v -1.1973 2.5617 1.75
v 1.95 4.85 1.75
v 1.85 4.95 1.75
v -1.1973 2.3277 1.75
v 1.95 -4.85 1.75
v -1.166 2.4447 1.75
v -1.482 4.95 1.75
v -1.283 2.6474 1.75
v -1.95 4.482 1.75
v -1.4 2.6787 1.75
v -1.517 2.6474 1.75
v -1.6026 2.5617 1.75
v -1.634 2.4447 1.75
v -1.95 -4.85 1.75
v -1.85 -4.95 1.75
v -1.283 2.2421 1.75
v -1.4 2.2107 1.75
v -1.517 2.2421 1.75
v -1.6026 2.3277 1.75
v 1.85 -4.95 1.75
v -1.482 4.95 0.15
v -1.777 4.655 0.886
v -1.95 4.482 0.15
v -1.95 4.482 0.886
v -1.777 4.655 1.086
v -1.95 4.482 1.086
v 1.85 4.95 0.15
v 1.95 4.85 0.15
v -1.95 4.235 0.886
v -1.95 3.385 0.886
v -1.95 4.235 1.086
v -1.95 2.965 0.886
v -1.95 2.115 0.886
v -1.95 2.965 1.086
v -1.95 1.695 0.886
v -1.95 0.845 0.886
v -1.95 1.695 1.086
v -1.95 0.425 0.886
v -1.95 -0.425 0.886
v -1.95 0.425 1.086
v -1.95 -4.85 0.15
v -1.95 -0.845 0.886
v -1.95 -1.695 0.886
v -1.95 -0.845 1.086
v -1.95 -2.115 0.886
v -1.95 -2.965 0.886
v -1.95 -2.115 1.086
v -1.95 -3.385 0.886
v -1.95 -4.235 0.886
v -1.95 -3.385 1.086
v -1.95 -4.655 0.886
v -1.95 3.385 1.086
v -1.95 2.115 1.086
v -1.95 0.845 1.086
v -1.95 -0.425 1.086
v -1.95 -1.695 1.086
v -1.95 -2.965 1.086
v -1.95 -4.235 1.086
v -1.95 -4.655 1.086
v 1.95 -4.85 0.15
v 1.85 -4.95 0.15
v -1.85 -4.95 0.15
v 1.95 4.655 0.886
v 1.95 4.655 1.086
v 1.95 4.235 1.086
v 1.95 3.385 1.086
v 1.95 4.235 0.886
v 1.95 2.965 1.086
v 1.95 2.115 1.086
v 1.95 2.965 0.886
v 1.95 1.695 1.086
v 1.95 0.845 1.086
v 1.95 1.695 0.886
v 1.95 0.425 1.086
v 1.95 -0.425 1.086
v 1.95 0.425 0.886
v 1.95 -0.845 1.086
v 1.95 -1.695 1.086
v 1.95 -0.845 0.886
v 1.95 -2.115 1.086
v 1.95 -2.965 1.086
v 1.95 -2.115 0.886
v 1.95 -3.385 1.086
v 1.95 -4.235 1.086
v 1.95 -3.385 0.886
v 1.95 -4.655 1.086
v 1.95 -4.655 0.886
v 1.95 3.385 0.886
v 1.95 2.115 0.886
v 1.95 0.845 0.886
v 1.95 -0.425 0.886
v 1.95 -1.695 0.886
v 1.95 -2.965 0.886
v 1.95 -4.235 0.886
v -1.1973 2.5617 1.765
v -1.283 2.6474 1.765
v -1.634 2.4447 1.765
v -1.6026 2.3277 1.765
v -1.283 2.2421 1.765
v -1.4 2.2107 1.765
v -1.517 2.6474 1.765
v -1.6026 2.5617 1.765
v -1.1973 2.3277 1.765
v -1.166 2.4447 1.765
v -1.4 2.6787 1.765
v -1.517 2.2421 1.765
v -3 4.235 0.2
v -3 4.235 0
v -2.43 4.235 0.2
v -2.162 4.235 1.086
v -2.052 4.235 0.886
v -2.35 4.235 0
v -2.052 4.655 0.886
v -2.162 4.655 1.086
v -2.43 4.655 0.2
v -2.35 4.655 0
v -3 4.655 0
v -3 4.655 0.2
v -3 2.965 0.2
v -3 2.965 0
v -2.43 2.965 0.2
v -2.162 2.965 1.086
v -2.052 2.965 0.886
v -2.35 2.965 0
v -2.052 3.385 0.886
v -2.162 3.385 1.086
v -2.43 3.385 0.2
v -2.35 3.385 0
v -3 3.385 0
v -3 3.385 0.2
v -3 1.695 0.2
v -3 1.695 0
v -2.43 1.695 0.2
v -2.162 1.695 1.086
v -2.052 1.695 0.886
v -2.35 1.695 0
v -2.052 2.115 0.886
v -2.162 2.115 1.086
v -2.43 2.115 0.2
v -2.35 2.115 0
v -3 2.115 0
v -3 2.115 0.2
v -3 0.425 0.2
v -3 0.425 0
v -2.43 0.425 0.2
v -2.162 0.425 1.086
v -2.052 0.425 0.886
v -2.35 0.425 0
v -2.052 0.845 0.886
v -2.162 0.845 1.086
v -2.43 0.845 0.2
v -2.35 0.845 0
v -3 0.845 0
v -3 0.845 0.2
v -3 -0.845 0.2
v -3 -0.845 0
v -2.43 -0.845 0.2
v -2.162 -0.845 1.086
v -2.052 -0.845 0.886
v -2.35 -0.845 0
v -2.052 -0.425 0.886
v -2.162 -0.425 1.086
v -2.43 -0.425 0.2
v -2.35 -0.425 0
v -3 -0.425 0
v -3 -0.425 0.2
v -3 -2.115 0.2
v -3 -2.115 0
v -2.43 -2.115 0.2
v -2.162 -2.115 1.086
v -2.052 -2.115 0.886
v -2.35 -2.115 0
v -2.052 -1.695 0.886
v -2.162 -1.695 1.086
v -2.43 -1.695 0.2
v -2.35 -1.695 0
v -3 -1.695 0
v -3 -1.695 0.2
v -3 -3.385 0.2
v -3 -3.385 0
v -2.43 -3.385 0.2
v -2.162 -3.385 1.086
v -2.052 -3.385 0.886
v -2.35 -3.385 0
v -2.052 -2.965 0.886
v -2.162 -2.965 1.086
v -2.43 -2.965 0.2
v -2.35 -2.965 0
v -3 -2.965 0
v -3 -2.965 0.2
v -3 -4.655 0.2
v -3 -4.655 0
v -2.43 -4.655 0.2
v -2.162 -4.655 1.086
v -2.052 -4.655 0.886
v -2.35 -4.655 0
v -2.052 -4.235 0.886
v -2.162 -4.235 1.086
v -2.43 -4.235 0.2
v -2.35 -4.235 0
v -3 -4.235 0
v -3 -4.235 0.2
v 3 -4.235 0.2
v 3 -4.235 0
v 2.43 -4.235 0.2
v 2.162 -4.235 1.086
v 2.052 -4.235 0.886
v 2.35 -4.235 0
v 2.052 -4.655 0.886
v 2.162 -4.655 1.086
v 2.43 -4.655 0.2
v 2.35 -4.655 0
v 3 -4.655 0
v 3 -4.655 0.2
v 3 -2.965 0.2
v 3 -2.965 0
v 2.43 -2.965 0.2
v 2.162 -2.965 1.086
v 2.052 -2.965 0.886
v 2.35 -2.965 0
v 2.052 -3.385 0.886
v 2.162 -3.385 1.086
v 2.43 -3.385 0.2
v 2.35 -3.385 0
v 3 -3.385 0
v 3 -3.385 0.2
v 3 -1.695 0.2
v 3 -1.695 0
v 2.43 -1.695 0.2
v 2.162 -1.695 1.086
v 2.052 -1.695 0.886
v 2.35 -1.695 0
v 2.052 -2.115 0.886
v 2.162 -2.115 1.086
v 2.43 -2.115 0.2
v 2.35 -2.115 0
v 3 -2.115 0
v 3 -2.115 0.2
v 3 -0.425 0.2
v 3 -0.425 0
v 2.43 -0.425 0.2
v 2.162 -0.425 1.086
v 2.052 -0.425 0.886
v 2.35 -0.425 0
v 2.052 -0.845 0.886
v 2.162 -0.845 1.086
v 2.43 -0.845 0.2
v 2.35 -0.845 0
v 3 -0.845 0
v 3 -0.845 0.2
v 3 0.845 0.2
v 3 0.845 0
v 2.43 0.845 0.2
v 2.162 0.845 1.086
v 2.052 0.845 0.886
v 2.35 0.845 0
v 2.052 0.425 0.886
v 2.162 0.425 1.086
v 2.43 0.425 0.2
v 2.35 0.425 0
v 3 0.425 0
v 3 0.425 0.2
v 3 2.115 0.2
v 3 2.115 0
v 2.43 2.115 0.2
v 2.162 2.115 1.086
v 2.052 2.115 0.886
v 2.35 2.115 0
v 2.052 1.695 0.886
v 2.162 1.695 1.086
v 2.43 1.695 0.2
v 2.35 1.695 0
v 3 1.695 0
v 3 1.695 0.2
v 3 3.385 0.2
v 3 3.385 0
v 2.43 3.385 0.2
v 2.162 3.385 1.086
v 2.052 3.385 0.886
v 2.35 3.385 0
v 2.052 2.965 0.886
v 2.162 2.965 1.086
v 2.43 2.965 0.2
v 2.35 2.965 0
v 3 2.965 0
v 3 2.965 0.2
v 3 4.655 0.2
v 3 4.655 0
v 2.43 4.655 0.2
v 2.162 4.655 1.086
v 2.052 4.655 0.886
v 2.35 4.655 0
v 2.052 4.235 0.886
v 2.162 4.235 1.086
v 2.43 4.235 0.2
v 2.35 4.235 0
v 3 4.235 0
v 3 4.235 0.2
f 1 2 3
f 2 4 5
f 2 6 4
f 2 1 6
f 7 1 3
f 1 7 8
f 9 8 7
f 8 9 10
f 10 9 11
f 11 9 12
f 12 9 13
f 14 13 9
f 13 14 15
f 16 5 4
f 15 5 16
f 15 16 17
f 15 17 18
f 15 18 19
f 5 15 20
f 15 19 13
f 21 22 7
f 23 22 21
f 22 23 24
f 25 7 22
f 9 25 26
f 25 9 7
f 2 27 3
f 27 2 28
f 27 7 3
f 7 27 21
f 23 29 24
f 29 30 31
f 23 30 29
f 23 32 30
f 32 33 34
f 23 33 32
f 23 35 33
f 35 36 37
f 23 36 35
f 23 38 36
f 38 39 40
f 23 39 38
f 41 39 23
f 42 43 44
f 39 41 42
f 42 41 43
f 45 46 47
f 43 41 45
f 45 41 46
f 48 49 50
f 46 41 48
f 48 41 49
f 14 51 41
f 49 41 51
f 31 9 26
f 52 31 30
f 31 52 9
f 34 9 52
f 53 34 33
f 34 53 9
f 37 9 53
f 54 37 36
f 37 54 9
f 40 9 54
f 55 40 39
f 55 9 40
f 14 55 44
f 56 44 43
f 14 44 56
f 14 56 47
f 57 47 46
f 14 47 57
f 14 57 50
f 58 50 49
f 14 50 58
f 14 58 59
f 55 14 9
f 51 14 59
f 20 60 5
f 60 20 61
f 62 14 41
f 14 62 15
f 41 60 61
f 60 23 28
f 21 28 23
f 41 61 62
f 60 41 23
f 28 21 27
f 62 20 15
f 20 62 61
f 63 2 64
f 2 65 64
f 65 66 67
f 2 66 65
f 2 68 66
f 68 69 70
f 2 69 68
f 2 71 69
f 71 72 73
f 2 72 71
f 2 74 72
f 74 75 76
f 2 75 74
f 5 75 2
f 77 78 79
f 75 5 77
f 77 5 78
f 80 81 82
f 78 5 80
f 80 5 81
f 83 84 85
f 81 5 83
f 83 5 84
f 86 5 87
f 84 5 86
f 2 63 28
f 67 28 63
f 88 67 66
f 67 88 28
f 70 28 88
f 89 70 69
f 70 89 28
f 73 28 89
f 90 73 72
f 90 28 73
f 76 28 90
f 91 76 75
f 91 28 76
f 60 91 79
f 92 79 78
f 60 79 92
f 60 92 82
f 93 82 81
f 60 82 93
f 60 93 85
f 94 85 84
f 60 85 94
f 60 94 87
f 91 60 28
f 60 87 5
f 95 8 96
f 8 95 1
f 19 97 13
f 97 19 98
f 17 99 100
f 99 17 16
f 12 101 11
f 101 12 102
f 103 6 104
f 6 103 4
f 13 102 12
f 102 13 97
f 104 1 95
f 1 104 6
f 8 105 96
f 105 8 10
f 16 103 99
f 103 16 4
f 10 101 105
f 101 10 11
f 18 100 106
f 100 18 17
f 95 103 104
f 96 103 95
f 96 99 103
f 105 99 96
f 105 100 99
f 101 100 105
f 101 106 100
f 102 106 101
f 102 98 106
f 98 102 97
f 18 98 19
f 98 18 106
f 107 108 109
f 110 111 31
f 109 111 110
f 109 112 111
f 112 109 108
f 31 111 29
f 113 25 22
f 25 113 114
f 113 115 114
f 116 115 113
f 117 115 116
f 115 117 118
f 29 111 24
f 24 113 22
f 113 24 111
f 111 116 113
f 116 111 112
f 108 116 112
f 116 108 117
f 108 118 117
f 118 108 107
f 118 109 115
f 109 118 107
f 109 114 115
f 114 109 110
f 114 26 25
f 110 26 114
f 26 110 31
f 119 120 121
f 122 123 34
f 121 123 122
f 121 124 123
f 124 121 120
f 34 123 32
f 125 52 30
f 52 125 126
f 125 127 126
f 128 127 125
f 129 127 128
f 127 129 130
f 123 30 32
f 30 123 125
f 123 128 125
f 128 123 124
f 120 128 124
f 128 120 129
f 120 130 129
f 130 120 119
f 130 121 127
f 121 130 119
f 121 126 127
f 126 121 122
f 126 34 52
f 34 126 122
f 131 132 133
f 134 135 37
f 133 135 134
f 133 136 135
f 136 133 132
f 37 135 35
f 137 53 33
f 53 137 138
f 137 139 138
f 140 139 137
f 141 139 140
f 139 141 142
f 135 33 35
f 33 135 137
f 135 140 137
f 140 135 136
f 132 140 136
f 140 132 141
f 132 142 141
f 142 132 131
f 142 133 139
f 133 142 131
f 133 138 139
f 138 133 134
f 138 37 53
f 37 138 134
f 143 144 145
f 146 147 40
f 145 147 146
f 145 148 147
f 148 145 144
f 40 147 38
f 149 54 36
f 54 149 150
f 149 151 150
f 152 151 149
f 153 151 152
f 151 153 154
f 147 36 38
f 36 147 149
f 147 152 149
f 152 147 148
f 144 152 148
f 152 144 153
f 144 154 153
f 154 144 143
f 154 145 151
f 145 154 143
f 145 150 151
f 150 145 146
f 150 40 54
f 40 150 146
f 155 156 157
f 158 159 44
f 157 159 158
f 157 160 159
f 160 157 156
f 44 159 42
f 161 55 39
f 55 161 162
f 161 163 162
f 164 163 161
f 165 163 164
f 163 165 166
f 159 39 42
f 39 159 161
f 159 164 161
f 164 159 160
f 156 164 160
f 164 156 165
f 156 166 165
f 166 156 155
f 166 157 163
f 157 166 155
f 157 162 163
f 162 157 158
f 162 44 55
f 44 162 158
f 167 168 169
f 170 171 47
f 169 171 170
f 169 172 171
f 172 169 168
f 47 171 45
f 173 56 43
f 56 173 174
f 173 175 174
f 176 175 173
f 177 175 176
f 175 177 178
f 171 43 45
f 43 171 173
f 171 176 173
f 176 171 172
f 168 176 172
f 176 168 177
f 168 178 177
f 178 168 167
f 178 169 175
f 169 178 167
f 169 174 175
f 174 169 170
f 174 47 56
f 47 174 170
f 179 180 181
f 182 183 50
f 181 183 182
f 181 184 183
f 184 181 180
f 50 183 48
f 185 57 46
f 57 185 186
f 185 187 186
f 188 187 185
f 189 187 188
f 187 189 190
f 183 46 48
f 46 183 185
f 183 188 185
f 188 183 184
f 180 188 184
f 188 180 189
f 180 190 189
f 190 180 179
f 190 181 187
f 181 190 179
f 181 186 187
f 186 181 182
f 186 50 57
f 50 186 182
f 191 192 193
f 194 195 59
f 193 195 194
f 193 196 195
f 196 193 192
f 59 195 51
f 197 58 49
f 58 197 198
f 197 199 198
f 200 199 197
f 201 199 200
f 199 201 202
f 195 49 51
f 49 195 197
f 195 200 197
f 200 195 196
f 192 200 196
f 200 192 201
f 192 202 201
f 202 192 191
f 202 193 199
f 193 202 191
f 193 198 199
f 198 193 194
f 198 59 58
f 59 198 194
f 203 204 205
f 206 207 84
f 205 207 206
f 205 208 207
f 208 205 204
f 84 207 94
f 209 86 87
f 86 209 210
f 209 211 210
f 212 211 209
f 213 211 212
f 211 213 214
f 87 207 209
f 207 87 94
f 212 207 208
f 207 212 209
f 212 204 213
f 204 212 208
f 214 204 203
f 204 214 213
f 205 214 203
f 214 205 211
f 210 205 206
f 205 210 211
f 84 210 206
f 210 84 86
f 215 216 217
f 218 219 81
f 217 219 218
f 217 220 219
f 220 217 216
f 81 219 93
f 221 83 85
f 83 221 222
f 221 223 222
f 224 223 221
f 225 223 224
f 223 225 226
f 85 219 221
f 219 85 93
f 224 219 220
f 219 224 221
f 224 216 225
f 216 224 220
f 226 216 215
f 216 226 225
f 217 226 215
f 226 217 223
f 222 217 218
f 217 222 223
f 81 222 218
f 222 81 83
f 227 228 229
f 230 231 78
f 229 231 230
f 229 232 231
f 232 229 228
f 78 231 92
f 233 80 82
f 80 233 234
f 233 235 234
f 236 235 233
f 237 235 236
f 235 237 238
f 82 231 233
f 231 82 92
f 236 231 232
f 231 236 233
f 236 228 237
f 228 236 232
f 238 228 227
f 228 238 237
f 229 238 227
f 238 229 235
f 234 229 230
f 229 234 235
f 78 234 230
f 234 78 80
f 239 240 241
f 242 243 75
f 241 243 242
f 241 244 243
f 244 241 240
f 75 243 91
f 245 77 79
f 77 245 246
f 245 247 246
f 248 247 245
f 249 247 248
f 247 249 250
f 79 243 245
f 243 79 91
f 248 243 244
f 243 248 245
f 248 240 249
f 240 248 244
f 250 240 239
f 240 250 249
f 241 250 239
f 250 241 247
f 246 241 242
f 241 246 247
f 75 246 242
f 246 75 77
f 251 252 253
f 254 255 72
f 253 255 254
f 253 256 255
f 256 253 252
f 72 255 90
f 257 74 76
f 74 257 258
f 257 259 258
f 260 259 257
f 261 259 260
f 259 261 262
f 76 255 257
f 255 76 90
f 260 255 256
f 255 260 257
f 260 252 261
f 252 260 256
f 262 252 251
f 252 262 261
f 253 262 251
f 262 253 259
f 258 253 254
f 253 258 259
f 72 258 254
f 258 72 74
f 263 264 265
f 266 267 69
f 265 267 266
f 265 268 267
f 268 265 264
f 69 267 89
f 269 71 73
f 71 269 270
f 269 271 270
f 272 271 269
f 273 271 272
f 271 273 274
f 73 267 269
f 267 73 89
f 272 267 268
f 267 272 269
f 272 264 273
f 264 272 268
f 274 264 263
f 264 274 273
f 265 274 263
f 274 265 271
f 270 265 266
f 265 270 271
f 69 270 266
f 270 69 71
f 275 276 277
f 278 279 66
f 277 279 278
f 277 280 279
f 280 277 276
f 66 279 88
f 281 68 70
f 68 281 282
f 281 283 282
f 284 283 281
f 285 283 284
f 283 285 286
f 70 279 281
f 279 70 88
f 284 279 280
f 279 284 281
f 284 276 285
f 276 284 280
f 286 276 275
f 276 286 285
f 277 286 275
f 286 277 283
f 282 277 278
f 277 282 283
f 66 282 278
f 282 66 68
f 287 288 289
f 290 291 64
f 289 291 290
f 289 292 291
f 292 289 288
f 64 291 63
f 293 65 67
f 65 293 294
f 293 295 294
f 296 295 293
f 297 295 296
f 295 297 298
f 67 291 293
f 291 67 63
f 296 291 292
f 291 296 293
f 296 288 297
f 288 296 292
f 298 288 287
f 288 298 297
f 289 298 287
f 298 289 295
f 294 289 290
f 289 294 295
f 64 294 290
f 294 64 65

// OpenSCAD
// =============================================================================
// ChipDocs.org Clean-Room Parametric OpenSCAD 3D Model: CH340G (C14267_SOP-16)
// Standard: IPC-7351B / JEDEC MS-012-AC | Units: Millimeters (mm)
// License : CERN-OHL-P-2.0 (100% Clean-Room Synthesized)
// =============================================================================
$fn = 32;
body_length_D = 9.900; // [mm] Package length D
body_width_E  = 3.900; // [mm] Package width E
total_height_A = 1.750; // [mm] Total height A
standoff_A1   = 0.150; // [mm] Standoff A1
pitch_e       = 1.270; // [mm] Nominal pin pitch e
scale_factor  = 1.0;

module chipdocs_component() {
  scale([scale_factor, scale_factor, scale_factor]) {
    // Solid #1: IC_BODY (EPOXY_BODY)
    color([0.120, 0.120, 0.130, 1.000])
      polyhedron(points=[[-1.8500, -4.9500, 0.1500], [1.8500, -4.9500, 0.1500], [1.9500, -4.8500, 0.1500], [1.9500, 4.8500, 0.1500], [1.8500, 4.9500, 0.1500], [-1.4820, 4.9500, 0.1500], [-1.9500, 4.4820, 0.1500], [-1.9500, -4.8500, 0.1500], [-1.8500, -4.9500, 1.7500], [1.8500, -4.9500, 1.7500], [1.9500, -4.8500, 1.7500], [1.9500, 4.8500, 1.7500], [1.8500, 4.9500, 1.7500], [-1.4820, 4.9500, 1.7500], [-1.9500, 4.4820, 1.7500], [-1.9500, -4.8500, 1.7500]], faces=[[7, 0, 1], [15, 9, 8], [7, 1, 2], [15, 10, 9], [7, 2, 3], [15, 11, 10], [7, 3, 4], [15, 12, 11], [7, 4, 5], [15, 13, 12], [5, 6, 7], [13, 15, 14], [0, 8, 9], [0, 9, 1], [1, 9, 10], [1, 10, 2], [2, 10, 11], [2, 11, 3], [3, 11, 12], [3, 12, 4], [4, 12, 13], [4, 13, 5], [5, 13, 14], [5, 14, 6], [6, 14, 15], [6, 15, 7], [7, 15, 8], [7, 8, 0]], convexity=6);
    // Solid #2: PIN1_MARKER (SILKSCREEN)
    color([0.920, 0.920, 0.920, 1.000])
      polyhedron(points=[[-1.1660, 2.4447, 1.7500], [-1.1973, 2.5617, 1.7500], [-1.2830, 2.6474, 1.7500], [-1.4000, 2.6787, 1.7500], [-1.5170, 2.6474, 1.7500], [-1.6026, 2.5617, 1.7500], [-1.6340, 2.4447, 1.7500], [-1.6026, 2.3277, 1.7500], [-1.5170, 2.2421, 1.7500], [-1.4000, 2.2107, 1.7500], [-1.2830, 2.2421, 1.7500], [-1.1973, 2.3277, 1.7500], [-1.1660, 2.4447, 1.7650], [-1.1973, 2.5617, 1.7650], [-1.2830, 2.6474, 1.7650], [-1.4000, 2.6787, 1.7650], [-1.5170, 2.6474, 1.7650], [-1.6026, 2.5617, 1.7650], [-1.6340, 2.4447, 1.7650], [-1.6026, 2.3277, 1.7650], [-1.5170, 2.2421, 1.7650], [-1.4000, 2.2107, 1.7650], [-1.2830, 2.2421, 1.7650], [-1.1973, 2.3277, 1.7650]], faces=[[11, 0, 1], [23, 13, 12], [11, 1, 2], [23, 14, 13], [11, 2, 3], [23, 15, 14], [11, 3, 4], [23, 16, 15], [11, 4, 5], [23, 17, 16], [11, 5, 6], [23, 18, 17], [11, 6, 7], [23, 19, 18], [11, 7, 8], [23, 20, 19], [11, 8, 9], [23, 21, 20], [9, 10, 11], [21, 23, 22], [0, 12, 13], [0, 13, 1], [1, 13, 14], [1, 14, 2], [2, 14, 15], [2, 15, 3], [3, 15, 16], [3, 16, 4], [4, 16, 17], [4, 17, 5], [5, 17, 18], [5, 18, 6], [6, 18, 19], [6, 19, 7], [7, 19, 20], [7, 20, 8], [8, 20, 21], [8, 21, 9], [9, 21, 22], [9, 22, 10], [10, 22, 23], [10, 23, 11], [11, 23, 12], [11, 12, 0]], convexity=6);
    // Solid #3: PIN_1 (METALLIC_LEAD)
    color([0.850, 0.860, 0.890, 1.000])
      polyhedron(points=[[-1.7300, 4.2350, 0.8860], [-2.0520, 4.2350, 0.8860], [-2.3500, 4.2350, 0.0000], [-3.0000, 4.2350, 0.0000], [-3.0000, 4.2350, 0.2000], [-2.4300, 4.2350, 0.2000], [-2.1620, 4.2350, 1.0860], [-1.7300, 4.2350, 1.0860], [-1.7300, 4.6550, 0.8860], [-2.0520, 4.6550, 0.8860], [-2.3500, 4.6550, 0.0000], [-3.0000, 4.6550, 0.0000], [-3.0000, 4.6550, 0.2000], [-2.4300, 4.6550, 0.2000], [-2.1620, 4.6550, 1.0860], [-1.7300, 4.6550, 1.0860]], faces=[[7, 0, 1], [15, 9, 8], [2, 3, 4], [10, 12, 11], [2, 4, 5], [10, 13, 12], [1, 2, 5], [9, 13, 10], [1, 5, 6], [9, 14, 13], [1, 6, 7], [9, 15, 14], [0, 8, 9], [0, 9, 1], [1, 9, 10], [1, 10, 2], [2, 10, 11], [2, 11, 3], [3, 11, 12], [3, 12, 4], [4, 12, 13], [4, 13, 5], [5, 13, 14], [5, 14, 6], [6, 14, 15], [6, 15, 7], [7, 15, 8], [7, 8, 0]], convexity=6);
    // Solid #4: PIN_2 (METALLIC_LEAD)
    color([0.850, 0.860, 0.890, 1.000])
      polyhedron(points=[[-1.7300, 2.9650, 0.8860], [-2.0520, 2.9650, 0.8860], [-2.3500, 2.9650, 0.0000], [-3.0000, 2.9650, 0.0000], [-3.0000, 2.9650, 0.2000], [-2.4300, 2.9650, 0.2000], [-2.1620, 2.9650, 1.0860], [-1.7300, 2.9650, 1.0860], [-1.7300, 3.3850, 0.8860], [-2.0520, 3.3850, 0.8860], [-2.3500, 3.3850, 0.0000], [-3.0000, 3.3850, 0.0000], [-3.0000, 3.3850, 0.2000], [-2.4300, 3.3850, 0.2000], [-2.1620, 3.3850, 1.0860], [-1.7300, 3.3850, 1.0860]], faces=[[7, 0, 1], [15, 9, 8], [2, 3, 4], [10, 12, 11], [2, 4, 5], [10, 13, 12], [1, 2, 5], [9, 13, 10], [1, 5, 6], [9, 14, 13], [1, 6, 7], [9, 15, 14], [0, 8, 9], [0, 9, 1], [1, 9, 10], [1, 10, 2], [2, 10, 11], [2, 11, 3], [3, 11, 12], [3, 12, 4], [4, 12, 13], [4, 13, 5], [5, 13, 14], [5, 14, 6], [6, 14, 15], [6, 15, 7], [7, 15, 8], [7, 8, 0]], convexity=6);
    // Solid #5: PIN_3 (METALLIC_LEAD)
    color([0.850, 0.860, 0.890, 1.000])
      polyhedron(points=[[-1.7300, 1.6950, 0.8860], [-2.0520, 1.6950, 0.8860], [-2.3500, 1.6950, 0.0000], [-3.0000, 1.6950, 0.0000], [-3.0000, 1.6950, 0.2000], [-2.4300, 1.6950, 0.2000], [-2.1620, 1.6950, 1.0860], [-1.7300, 1.6950, 1.0860], [-1.7300, 2.1150, 0.8860], [-2.0520, 2.1150, 0.8860], [-2.3500, 2.1150, 0.0000], [-3.0000, 2.1150, 0.0000], [-3.0000, 2.1150, 0.2000], [-2.4300, 2.1150, 0.2000], [-2.1620, 2.1150, 1.0860], [-1.7300, 2.1150, 1.0860]], faces=[[7, 0, 1], [15, 9, 8], [2, 3, 4], [10, 12, 11], [2, 4, 5], [10, 13, 12], [1, 2, 5], [9, 13, 10], [1, 5, 6], [9, 14, 13], [1, 6, 7], [9, 15, 14], [0, 8, 9], [0, 9, 1], [1, 9, 10], [1, 10, 2], [2, 10, 11], [2, 11, 3], [3, 11, 12], [3, 12, 4], [4, 12, 13], [4, 13, 5], [5, 13, 14], [5, 14, 6], [6, 14, 15], [6, 15, 7], [7, 15, 8], [7, 8, 0]], convexity=6);
    // Solid #6: PIN_4 (METALLIC_LEAD)
    color([0.850, 0.860, 0.890, 1.000])
      polyhedron(points=[[-1.7300, 0.4250, 0.8860], [-2.0520, 0.4250, 0.8860], [-2.3500, 0.4250, 0.0000], [-3.0000, 0.4250, 0.0000], [-3.0000, 0.4250, 0.2000], [-2.4300, 0.4250, 0.2000], [-2.1620, 0.4250, 1.0860], [-1.7300, 0.4250, 1.0860], [-1.7300, 0.8450, 0.8860], [-2.0520, 0.8450, 0.8860], [-2.3500, 0.8450, 0.0000], [-3.0000, 0.8450, 0.0000], [-3.0000, 0.8450, 0.2000], [-2.4300, 0.8450, 0.2000], [-2.1620, 0.8450, 1.0860], [-1.7300, 0.8450, 1.0860]], faces=[[7, 0, 1], [15, 9, 8], [2, 3, 4], [10, 12, 11], [2, 4, 5], [10, 13, 12], [1, 2, 5], [9, 13, 10], [1, 5, 6], [9, 14, 13], [1, 6, 7], [9, 15, 14], [0, 8, 9], [0, 9, 1], [1, 9, 10], [1, 10, 2], [2, 10, 11], [2, 11, 3], [3, 11, 12], [3, 12, 4], [4, 12, 13], [4, 13, 5], [5, 13, 14], [5, 14, 6], [6, 14, 15], [6, 15, 7], [7, 15, 8], [7, 8, 0]], convexity=6);
    // Solid #7: PIN_5 (METALLIC_LEAD)
    color([0.850, 0.860, 0.890, 1.000])
      polyhedron(points=[[-1.7300, -0.8450, 0.8860], [-2.0520, -0.8450, 0.8860], [-2.3500, -0.8450, 0.0000], [-3.0000, -0.8450, 0.0000], [-3.0000, -0.8450, 0.2000], [-2.4300, -0.8450, 0.2000], [-2.1620, -0.8450, 1.0860], [-1.7300, -0.8450, 1.0860], [-1.7300, -0.4250, 0.8860], [-2.0520, -0.4250, 0.8860], [-2.3500, -0.4250, 0.0000], [-3.0000, -0.4250, 0.0000], [-3.0000, -0.4250, 0.2000], [-2.4300, -0.4250, 0.2000], [-2.1620, -0.4250, 1.0860], [-1.7300, -0.4250, 1.0860]], faces=[[7, 0, 1], [15, 9, 8], [2, 3, 4], [10, 12, 11], [2, 4, 5], [10, 13, 12], [1, 2, 5], [9, 13, 10], [1, 5, 6], [9, 14, 13], [1, 6, 7], [9, 15, 14], [0, 8, 9], [0, 9, 1], [1, 9, 10], [1, 10, 2], [2, 10, 11], [2, 11, 3], [3, 11, 12], [3, 12, 4], [4, 12, 13], [4, 13, 5], [5, 13, 14], [5, 14, 6], [6, 14, 15], [6, 15, 7], [7, 15, 8], [7, 8, 0]], convexity=6);
    // Solid #8: PIN_6 (METALLIC_LEAD)
    color([0.850, 0.860, 0.890, 1.000])
      polyhedron(points=[[-1.7300, -2.1150, 0.8860], [-2.0520, -2.1150, 0.8860], [-2.3500, -2.1150, 0.0000], [-3.0000, -2.1150, 0.0000], [-3.0000, -2.1150, 0.2000], [-2.4300, -2.1150, 0.2000], [-2.1620, -2.1150, 1.0860], [-1.7300, -2.1150, 1.0860], [-1.7300, -1.6950, 0.8860], [-2.0520, -1.6950, 0.8860], [-2.3500, -1.6950, 0.0000], [-3.0000, -1.6950, 0.0000], [-3.0000, -1.6950, 0.2000], [-2.4300, -1.6950, 0.2000], [-2.1620, -1.6950, 1.0860], [-1.7300, -1.6950, 1.0860]], faces=[[7, 0, 1], [15, 9, 8], [2, 3, 4], [10, 12, 11], [2, 4, 5], [10, 13, 12], [1, 2, 5], [9, 13, 10], [1, 5, 6], [9, 14, 13], [1, 6, 7], [9, 15, 14], [0, 8, 9], [0, 9, 1], [1, 9, 10], [1, 10, 2], [2, 10, 11], [2, 11, 3], [3, 11, 12], [3, 12, 4], [4, 12, 13], [4, 13, 5], [5, 13, 14], [5, 14, 6], [6, 14, 15], [6, 15, 7], [7, 15, 8], [7, 8, 0]], convexity=6);
    // Solid #9: PIN_7 (METALLIC_LEAD)
    color([0.850, 0.860, 0.890, 1.000])
      polyhedron(points=[[-1.7300, -3.3850, 0.8860], [-2.0520, -3.3850, 0.8860], [-2.3500, -3.3850, 0.0000], [-3.0000, -3.3850, 0.0000], [-3.0000, -3.3850, 0.2000], [-2.4300, -3.3850, 0.2000], [-2.1620, -3.3850, 1.0860], [-1.7300, -3.3850, 1.0860], [-1.7300, -2.9650, 0.8860], [-2.0520, -2.9650, 0.8860], [-2.3500, -2.9650, 0.0000], [-3.0000, -2.9650, 0.0000], [-3.0000, -2.9650, 0.2000], [-2.4300, -2.9650, 0.2000], [-2.1620, -2.9650, 1.0860], [-1.7300, -2.9650, 1.0860]], faces=[[7, 0, 1], [15, 9, 8], [2, 3, 4], [10, 12, 11], [2, 4, 5], [10, 13, 12], [1, 2, 5], [9, 13, 10], [1, 5, 6], [9, 14, 13], [1, 6, 7], [9, 15, 14], [0, 8, 9], [0, 9, 1], [1, 9, 10], [1, 10, 2], [2, 10, 11], [2, 11, 3], [3, 11, 12], [3, 12, 4], [4, 12, 13], [4, 13, 5], [5, 13, 14], [5, 14, 6], [6, 14, 15], [6, 15, 7], [7, 15, 8], [7, 8, 0]], convexity=6);
    // Solid #10: PIN_8 (METALLIC_LEAD)
    color([0.850, 0.860, 0.890, 1.000])
      polyhedron(points=[[-1.7300, -4.6550, 0.8860], [-2.0520, -4.6550, 0.8860], [-2.3500, -4.6550, 0.0000], [-3.0000, -4.6550, 0.0000], [-3.0000, -4.6550, 0.2000], [-2.4300, -4.6550, 0.2000], [-2.1620, -4.6550, 1.0860], [-1.7300, -4.6550, 1.0860], [-1.7300, -4.2350, 0.8860], [-2.0520, -4.2350, 0.8860], [-2.3500, -4.2350, 0.0000], [-3.0000, -4.2350, 0.0000], [-3.0000, -4.2350, 0.2000], [-2.4300, -4.2350, 0.2000], [-2.1620, -4.2350, 1.0860], [-1.7300, -4.2350, 1.0860]], faces=[[7, 0, 1], [15, 9, 8], [2, 3, 4], [10, 12, 11], [2, 4, 5], [10, 13, 12], [1, 2, 5], [9, 13, 10], [1, 5, 6], [9, 14, 13], [1, 6, 7], [9, 15, 14], [0, 8, 9], [0, 9, 1], [1, 9, 10], [1, 10, 2], [2, 10, 11], [2, 11, 3], [3, 11, 12], [3, 12, 4], [4, 12, 13], [4, 13, 5], [5, 13, 14], [5, 14, 6], [6, 14, 15], [6, 15, 7], [7, 15, 8], [7, 8, 0]], convexity=6);
    // Solid #11: PIN_9 (METALLIC_LEAD)
    color([0.850, 0.860, 0.890, 1.000])
      polyhedron(points=[[1.7300, -4.2350, 0.8860], [2.0520, -4.2350, 0.8860], [2.3500, -4.2350, 0.0000], [3.0000, -4.2350, 0.0000], [3.0000, -4.2350, 0.2000], [2.4300, -4.2350, 0.2000], [2.1620, -4.2350, 1.0860], [1.7300, -4.2350, 1.0860], [1.7300, -4.6550, 0.8860], [2.0520, -4.6550, 0.8860], [2.3500, -4.6550, 0.0000], [3.0000, -4.6550, 0.0000], [3.0000, -4.6550, 0.2000], [2.4300, -4.6550, 0.2000], [2.1620, -4.6550, 1.0860], [1.7300, -4.6550, 1.0860]], faces=[[7, 0, 1], [15, 9, 8], [2, 3, 4], [10, 12, 11], [2, 4, 5], [10, 13, 12], [1, 2, 5], [9, 13, 10], [1, 5, 6], [9, 14, 13], [1, 6, 7], [9, 15, 14], [0, 8, 9], [0, 9, 1], [1, 9, 10], [1, 10, 2], [2, 10, 11], [2, 11, 3], [3, 11, 12], [3, 12, 4], [4, 12, 13], [4, 13, 5], [5, 13, 14], [5, 14, 6], [6, 14, 15], [6, 15, 7], [7, 15, 8], [7, 8, 0]], convexity=6);
    // Solid #12: PIN_10 (METALLIC_LEAD)
    color([0.850, 0.860, 0.890, 1.000])
      polyhedron(points=[[1.7300, -2.9650, 0.8860], [2.0520, -2.9650, 0.8860], [2.3500, -2.9650, 0.0000], [3.0000, -2.9650, 0.0000], [3.0000, -2.9650, 0.2000], [2.4300, -2.9650, 0.2000], [2.1620, -2.9650, 1.0860], [1.7300, -2.9650, 1.0860], [1.7300, -3.3850, 0.8860], [2.0520, -3.3850, 0.8860], [2.3500, -3.3850, 0.0000], [3.0000, -3.3850, 0.0000], [3.0000, -3.3850, 0.2000], [2.4300, -3.3850, 0.2000], [2.1620, -3.3850, 1.0860], [1.7300, -3.3850, 1.0860]], faces=[[7, 0, 1], [15, 9, 8], [2, 3, 4], [10, 12, 11], [2, 4, 5], [10, 13, 12], [1, 2, 5], [9, 13, 10], [1, 5, 6], [9, 14, 13], [1, 6, 7], [9, 15, 14], [0, 8, 9], [0, 9, 1], [1, 9, 10], [1, 10, 2], [2, 10, 11], [2, 11, 3], [3, 11, 12], [3, 12, 4], [4, 12, 13], [4, 13, 5], [5, 13, 14], [5, 14, 6], [6, 14, 15], [6, 15, 7], [7, 15, 8], [7, 8, 0]], convexity=6);
    // Solid #13: PIN_11 (METALLIC_LEAD)
    color([0.850, 0.860, 0.890, 1.000])
      polyhedron(points=[[1.7300, -1.6950, 0.8860], [2.0520, -1.6950, 0.8860], [2.3500, -1.6950, 0.0000], [3.0000, -1.6950, 0.0000], [3.0000, -1.6950, 0.2000], [2.4300, -1.6950, 0.2000], [2.1620, -1.6950, 1.0860], [1.7300, -1.6950, 1.0860], [1.7300, -2.1150, 0.8860], [2.0520, -2.1150, 0.8860], [2.3500, -2.1150, 0.0000], [3.0000, -2.1150, 0.0000], [3.0000, -2.1150, 0.2000], [2.4300, -2.1150, 0.2000], [2.1620, -2.1150, 1.0860], [1.7300, -2.1150, 1.0860]], faces=[[7, 0, 1], [15, 9, 8], [2, 3, 4], [10, 12, 11], [2, 4, 5], [10, 13, 12], [1, 2, 5], [9, 13, 10], [1, 5, 6], [9, 14, 13], [1, 6, 7], [9, 15, 14], [0, 8, 9], [0, 9, 1], [1, 9, 10], [1, 10, 2], [2, 10, 11], [2, 11, 3], [3, 11, 12], [3, 12, 4], [4, 12, 13], [4, 13, 5], [5, 13, 14], [5, 14, 6], [6, 14, 15], [6, 15, 7], [7, 15, 8], [7, 8, 0]], convexity=6);
    // Solid #14: PIN_12 (METALLIC_LEAD)
    color([0.850, 0.860, 0.890, 1.000])
      polyhedron(points=[[1.7300, -0.4250, 0.8860], [2.0520, -0.4250, 0.8860], [2.3500, -0.4250, 0.0000], [3.0000, -0.4250, 0.0000], [3.0000, -0.4250, 0.2000], [2.4300, -0.4250, 0.2000], [2.1620, -0.4250, 1.0860], [1.7300, -0.4250, 1.0860], [1.7300, -0.8450, 0.8860], [2.0520, -0.8450, 0.8860], [2.3500, -0.8450, 0.0000], [3.0000, -0.8450, 0.0000], [3.0000, -0.8450, 0.2000], [2.4300, -0.8450, 0.2000], [2.1620, -0.8450, 1.0860], [1.7300, -0.8450, 1.0860]], faces=[[7, 0, 1], [15, 9, 8], [2, 3, 4], [10, 12, 11], [2, 4, 5], [10, 13, 12], [1, 2, 5], [9, 13, 10], [1, 5, 6], [9, 14, 13], [1, 6, 7], [9, 15, 14], [0, 8, 9], [0, 9, 1], [1, 9, 10], [1, 10, 2], [2, 10, 11], [2, 11, 3], [3, 11, 12], [3, 12, 4], [4, 12, 13], [4, 13, 5], [5, 13, 14], [5, 14, 6], [6, 14, 15], [6, 15, 7], [7, 15, 8], [7, 8, 0]], convexity=6);
    // Solid #15: PIN_13 (METALLIC_LEAD)
    color([0.850, 0.860, 0.890, 1.000])
      polyhedron(points=[[1.7300, 0.8450, 0.8860], [2.0520, 0.8450, 0.8860], [2.3500, 0.8450, 0.0000], [3.0000, 0.8450, 0.0000], [3.0000, 0.8450, 0.2000], [2.4300, 0.8450, 0.2000], [2.1620, 0.8450, 1.0860], [1.7300, 0.8450, 1.0860], [1.7300, 0.4250, 0.8860], [2.0520, 0.4250, 0.8860], [2.3500, 0.4250, 0.0000], [3.0000, 0.4250, 0.0000], [3.0000, 0.4250, 0.2000], [2.4300, 0.4250, 0.2000], [2.1620, 0.4250, 1.0860], [1.7300, 0.4250, 1.0860]], faces=[[7, 0, 1], [15, 9, 8], [2, 3, 4], [10, 12, 11], [2, 4, 5], [10, 13, 12], [1, 2, 5], [9, 13, 10], [1, 5, 6], [9, 14, 13], [1, 6, 7], [9, 15, 14], [0, 8, 9], [0, 9, 1], [1, 9, 10], [1, 10, 2], [2, 10, 11], [2, 11, 3], [3, 11, 12], [3, 12, 4], [4, 12, 13], [4, 13, 5], [5, 13, 14], [5, 14, 6], [6, 14, 15], [6, 15, 7], [7, 15, 8], [7, 8, 0]], convexity=6);
    // Solid #16: PIN_14 (METALLIC_LEAD)
    color([0.850, 0.860, 0.890, 1.000])
      polyhedron(points=[[1.7300, 2.1150, 0.8860], [2.0520, 2.1150, 0.8860], [2.3500, 2.1150, 0.0000], [3.0000, 2.1150, 0.0000], [3.0000, 2.1150, 0.2000], [2.4300, 2.1150, 0.2000], [2.1620, 2.1150, 1.0860], [1.7300, 2.1150, 1.0860], [1.7300, 1.6950, 0.8860], [2.0520, 1.6950, 0.8860], [2.3500, 1.6950, 0.0000], [3.0000, 1.6950, 0.0000], [3.0000, 1.6950, 0.2000], [2.4300, 1.6950, 0.2000], [2.1620, 1.6950, 1.0860], [1.7300, 1.6950, 1.0860]], faces=[[7, 0, 1], [15, 9, 8], [2, 3, 4], [10, 12, 11], [2, 4, 5], [10, 13, 12], [1, 2, 5], [9, 13, 10], [1, 5, 6], [9, 14, 13], [1, 6, 7], [9, 15, 14], [0, 8, 9], [0, 9, 1], [1, 9, 10], [1, 10, 2], [2, 10, 11], [2, 11, 3], [3, 11, 12], [3, 12, 4], [4, 12, 13], [4, 13, 5], [5, 13, 14], [5, 14, 6], [6, 14, 15], [6, 15, 7], [7, 15, 8], [7, 8, 0]], convexity=6);
    // Solid #17: PIN_15 (METALLIC_LEAD)
    color([0.850, 0.860, 0.890, 1.000])
      polyhedron(points=[[1.7300, 3.3850, 0.8860], [2.0520, 3.3850, 0.8860], [2.3500, 3.3850, 0.0000], [3.0000, 3.3850, 0.0000], [3.0000, 3.3850, 0.2000], [2.4300, 3.3850, 0.2000], [2.1620, 3.3850, 1.0860], [1.7300, 3.3850, 1.0860], [1.7300, 2.9650, 0.8860], [2.0520, 2.9650, 0.8860], [2.3500, 2.9650, 0.0000], [3.0000, 2.9650, 0.0000], [3.0000, 2.9650, 0.2000], [2.4300, 2.9650, 0.2000], [2.1620, 2.9650, 1.0860], [1.7300, 2.9650, 1.0860]], faces=[[7, 0, 1], [15, 9, 8], [2, 3, 4], [10, 12, 11], [2, 4, 5], [10, 13, 12], [1, 2, 5], [9, 13, 10], [1, 5, 6], [9, 14, 13], [1, 6, 7], [9, 15, 14], [0, 8, 9], [0, 9, 1], [1, 9, 10], [1, 10, 2], [2, 10, 11], [2, 11, 3], [3, 11, 12], [3, 12, 4], [4, 12, 13], [4, 13, 5], [5, 13, 14], [5, 14, 6], [6, 14, 15], [6, 15, 7], [7, 15, 8], [7, 8, 0]], convexity=6);
    // Solid #18: PIN_16 (METALLIC_LEAD)
    color([0.850, 0.860, 0.890, 1.000])
      polyhedron(points=[[1.7300, 4.6550, 0.8860], [2.0520, 4.6550, 0.8860], [2.3500, 4.6550, 0.0000], [3.0000, 4.6550, 0.0000], [3.0000, 4.6550, 0.2000], [2.4300, 4.6550, 0.2000], [2.1620, 4.6550, 1.0860], [1.7300, 4.6550, 1.0860], [1.7300, 4.2350, 0.8860], [2.0520, 4.2350, 0.8860], [2.3500, 4.2350, 0.0000], [3.0000, 4.2350, 0.0000], [3.0000, 4.2350, 0.2000], [2.4300, 4.2350, 0.2000], [2.1620, 4.2350, 1.0860], [1.7300, 4.2350, 1.0860]], faces=[[7, 0, 1], [15, 9, 8], [2, 3, 4], [10, 12, 11], [2, 4, 5], [10, 13, 12], [1, 2, 5], [9, 13, 10], [1, 5, 6], [9, 14, 13], [1, 6, 7], [9, 15, 14], [0, 8, 9], [0, 9, 1], [1, 9, 10], [1, 10, 2], [2, 10, 11], [2, 11, 3], [3, 11, 12], [3, 12, 4], [4, 12, 13], [4, 13, 5], [5, 13, 14], [5, 14, 6], [6, 14, 15], [6, 15, 7], [7, 15, 8], [7, 8, 0]], convexity=6);
  }
}

chipdocs_component();
